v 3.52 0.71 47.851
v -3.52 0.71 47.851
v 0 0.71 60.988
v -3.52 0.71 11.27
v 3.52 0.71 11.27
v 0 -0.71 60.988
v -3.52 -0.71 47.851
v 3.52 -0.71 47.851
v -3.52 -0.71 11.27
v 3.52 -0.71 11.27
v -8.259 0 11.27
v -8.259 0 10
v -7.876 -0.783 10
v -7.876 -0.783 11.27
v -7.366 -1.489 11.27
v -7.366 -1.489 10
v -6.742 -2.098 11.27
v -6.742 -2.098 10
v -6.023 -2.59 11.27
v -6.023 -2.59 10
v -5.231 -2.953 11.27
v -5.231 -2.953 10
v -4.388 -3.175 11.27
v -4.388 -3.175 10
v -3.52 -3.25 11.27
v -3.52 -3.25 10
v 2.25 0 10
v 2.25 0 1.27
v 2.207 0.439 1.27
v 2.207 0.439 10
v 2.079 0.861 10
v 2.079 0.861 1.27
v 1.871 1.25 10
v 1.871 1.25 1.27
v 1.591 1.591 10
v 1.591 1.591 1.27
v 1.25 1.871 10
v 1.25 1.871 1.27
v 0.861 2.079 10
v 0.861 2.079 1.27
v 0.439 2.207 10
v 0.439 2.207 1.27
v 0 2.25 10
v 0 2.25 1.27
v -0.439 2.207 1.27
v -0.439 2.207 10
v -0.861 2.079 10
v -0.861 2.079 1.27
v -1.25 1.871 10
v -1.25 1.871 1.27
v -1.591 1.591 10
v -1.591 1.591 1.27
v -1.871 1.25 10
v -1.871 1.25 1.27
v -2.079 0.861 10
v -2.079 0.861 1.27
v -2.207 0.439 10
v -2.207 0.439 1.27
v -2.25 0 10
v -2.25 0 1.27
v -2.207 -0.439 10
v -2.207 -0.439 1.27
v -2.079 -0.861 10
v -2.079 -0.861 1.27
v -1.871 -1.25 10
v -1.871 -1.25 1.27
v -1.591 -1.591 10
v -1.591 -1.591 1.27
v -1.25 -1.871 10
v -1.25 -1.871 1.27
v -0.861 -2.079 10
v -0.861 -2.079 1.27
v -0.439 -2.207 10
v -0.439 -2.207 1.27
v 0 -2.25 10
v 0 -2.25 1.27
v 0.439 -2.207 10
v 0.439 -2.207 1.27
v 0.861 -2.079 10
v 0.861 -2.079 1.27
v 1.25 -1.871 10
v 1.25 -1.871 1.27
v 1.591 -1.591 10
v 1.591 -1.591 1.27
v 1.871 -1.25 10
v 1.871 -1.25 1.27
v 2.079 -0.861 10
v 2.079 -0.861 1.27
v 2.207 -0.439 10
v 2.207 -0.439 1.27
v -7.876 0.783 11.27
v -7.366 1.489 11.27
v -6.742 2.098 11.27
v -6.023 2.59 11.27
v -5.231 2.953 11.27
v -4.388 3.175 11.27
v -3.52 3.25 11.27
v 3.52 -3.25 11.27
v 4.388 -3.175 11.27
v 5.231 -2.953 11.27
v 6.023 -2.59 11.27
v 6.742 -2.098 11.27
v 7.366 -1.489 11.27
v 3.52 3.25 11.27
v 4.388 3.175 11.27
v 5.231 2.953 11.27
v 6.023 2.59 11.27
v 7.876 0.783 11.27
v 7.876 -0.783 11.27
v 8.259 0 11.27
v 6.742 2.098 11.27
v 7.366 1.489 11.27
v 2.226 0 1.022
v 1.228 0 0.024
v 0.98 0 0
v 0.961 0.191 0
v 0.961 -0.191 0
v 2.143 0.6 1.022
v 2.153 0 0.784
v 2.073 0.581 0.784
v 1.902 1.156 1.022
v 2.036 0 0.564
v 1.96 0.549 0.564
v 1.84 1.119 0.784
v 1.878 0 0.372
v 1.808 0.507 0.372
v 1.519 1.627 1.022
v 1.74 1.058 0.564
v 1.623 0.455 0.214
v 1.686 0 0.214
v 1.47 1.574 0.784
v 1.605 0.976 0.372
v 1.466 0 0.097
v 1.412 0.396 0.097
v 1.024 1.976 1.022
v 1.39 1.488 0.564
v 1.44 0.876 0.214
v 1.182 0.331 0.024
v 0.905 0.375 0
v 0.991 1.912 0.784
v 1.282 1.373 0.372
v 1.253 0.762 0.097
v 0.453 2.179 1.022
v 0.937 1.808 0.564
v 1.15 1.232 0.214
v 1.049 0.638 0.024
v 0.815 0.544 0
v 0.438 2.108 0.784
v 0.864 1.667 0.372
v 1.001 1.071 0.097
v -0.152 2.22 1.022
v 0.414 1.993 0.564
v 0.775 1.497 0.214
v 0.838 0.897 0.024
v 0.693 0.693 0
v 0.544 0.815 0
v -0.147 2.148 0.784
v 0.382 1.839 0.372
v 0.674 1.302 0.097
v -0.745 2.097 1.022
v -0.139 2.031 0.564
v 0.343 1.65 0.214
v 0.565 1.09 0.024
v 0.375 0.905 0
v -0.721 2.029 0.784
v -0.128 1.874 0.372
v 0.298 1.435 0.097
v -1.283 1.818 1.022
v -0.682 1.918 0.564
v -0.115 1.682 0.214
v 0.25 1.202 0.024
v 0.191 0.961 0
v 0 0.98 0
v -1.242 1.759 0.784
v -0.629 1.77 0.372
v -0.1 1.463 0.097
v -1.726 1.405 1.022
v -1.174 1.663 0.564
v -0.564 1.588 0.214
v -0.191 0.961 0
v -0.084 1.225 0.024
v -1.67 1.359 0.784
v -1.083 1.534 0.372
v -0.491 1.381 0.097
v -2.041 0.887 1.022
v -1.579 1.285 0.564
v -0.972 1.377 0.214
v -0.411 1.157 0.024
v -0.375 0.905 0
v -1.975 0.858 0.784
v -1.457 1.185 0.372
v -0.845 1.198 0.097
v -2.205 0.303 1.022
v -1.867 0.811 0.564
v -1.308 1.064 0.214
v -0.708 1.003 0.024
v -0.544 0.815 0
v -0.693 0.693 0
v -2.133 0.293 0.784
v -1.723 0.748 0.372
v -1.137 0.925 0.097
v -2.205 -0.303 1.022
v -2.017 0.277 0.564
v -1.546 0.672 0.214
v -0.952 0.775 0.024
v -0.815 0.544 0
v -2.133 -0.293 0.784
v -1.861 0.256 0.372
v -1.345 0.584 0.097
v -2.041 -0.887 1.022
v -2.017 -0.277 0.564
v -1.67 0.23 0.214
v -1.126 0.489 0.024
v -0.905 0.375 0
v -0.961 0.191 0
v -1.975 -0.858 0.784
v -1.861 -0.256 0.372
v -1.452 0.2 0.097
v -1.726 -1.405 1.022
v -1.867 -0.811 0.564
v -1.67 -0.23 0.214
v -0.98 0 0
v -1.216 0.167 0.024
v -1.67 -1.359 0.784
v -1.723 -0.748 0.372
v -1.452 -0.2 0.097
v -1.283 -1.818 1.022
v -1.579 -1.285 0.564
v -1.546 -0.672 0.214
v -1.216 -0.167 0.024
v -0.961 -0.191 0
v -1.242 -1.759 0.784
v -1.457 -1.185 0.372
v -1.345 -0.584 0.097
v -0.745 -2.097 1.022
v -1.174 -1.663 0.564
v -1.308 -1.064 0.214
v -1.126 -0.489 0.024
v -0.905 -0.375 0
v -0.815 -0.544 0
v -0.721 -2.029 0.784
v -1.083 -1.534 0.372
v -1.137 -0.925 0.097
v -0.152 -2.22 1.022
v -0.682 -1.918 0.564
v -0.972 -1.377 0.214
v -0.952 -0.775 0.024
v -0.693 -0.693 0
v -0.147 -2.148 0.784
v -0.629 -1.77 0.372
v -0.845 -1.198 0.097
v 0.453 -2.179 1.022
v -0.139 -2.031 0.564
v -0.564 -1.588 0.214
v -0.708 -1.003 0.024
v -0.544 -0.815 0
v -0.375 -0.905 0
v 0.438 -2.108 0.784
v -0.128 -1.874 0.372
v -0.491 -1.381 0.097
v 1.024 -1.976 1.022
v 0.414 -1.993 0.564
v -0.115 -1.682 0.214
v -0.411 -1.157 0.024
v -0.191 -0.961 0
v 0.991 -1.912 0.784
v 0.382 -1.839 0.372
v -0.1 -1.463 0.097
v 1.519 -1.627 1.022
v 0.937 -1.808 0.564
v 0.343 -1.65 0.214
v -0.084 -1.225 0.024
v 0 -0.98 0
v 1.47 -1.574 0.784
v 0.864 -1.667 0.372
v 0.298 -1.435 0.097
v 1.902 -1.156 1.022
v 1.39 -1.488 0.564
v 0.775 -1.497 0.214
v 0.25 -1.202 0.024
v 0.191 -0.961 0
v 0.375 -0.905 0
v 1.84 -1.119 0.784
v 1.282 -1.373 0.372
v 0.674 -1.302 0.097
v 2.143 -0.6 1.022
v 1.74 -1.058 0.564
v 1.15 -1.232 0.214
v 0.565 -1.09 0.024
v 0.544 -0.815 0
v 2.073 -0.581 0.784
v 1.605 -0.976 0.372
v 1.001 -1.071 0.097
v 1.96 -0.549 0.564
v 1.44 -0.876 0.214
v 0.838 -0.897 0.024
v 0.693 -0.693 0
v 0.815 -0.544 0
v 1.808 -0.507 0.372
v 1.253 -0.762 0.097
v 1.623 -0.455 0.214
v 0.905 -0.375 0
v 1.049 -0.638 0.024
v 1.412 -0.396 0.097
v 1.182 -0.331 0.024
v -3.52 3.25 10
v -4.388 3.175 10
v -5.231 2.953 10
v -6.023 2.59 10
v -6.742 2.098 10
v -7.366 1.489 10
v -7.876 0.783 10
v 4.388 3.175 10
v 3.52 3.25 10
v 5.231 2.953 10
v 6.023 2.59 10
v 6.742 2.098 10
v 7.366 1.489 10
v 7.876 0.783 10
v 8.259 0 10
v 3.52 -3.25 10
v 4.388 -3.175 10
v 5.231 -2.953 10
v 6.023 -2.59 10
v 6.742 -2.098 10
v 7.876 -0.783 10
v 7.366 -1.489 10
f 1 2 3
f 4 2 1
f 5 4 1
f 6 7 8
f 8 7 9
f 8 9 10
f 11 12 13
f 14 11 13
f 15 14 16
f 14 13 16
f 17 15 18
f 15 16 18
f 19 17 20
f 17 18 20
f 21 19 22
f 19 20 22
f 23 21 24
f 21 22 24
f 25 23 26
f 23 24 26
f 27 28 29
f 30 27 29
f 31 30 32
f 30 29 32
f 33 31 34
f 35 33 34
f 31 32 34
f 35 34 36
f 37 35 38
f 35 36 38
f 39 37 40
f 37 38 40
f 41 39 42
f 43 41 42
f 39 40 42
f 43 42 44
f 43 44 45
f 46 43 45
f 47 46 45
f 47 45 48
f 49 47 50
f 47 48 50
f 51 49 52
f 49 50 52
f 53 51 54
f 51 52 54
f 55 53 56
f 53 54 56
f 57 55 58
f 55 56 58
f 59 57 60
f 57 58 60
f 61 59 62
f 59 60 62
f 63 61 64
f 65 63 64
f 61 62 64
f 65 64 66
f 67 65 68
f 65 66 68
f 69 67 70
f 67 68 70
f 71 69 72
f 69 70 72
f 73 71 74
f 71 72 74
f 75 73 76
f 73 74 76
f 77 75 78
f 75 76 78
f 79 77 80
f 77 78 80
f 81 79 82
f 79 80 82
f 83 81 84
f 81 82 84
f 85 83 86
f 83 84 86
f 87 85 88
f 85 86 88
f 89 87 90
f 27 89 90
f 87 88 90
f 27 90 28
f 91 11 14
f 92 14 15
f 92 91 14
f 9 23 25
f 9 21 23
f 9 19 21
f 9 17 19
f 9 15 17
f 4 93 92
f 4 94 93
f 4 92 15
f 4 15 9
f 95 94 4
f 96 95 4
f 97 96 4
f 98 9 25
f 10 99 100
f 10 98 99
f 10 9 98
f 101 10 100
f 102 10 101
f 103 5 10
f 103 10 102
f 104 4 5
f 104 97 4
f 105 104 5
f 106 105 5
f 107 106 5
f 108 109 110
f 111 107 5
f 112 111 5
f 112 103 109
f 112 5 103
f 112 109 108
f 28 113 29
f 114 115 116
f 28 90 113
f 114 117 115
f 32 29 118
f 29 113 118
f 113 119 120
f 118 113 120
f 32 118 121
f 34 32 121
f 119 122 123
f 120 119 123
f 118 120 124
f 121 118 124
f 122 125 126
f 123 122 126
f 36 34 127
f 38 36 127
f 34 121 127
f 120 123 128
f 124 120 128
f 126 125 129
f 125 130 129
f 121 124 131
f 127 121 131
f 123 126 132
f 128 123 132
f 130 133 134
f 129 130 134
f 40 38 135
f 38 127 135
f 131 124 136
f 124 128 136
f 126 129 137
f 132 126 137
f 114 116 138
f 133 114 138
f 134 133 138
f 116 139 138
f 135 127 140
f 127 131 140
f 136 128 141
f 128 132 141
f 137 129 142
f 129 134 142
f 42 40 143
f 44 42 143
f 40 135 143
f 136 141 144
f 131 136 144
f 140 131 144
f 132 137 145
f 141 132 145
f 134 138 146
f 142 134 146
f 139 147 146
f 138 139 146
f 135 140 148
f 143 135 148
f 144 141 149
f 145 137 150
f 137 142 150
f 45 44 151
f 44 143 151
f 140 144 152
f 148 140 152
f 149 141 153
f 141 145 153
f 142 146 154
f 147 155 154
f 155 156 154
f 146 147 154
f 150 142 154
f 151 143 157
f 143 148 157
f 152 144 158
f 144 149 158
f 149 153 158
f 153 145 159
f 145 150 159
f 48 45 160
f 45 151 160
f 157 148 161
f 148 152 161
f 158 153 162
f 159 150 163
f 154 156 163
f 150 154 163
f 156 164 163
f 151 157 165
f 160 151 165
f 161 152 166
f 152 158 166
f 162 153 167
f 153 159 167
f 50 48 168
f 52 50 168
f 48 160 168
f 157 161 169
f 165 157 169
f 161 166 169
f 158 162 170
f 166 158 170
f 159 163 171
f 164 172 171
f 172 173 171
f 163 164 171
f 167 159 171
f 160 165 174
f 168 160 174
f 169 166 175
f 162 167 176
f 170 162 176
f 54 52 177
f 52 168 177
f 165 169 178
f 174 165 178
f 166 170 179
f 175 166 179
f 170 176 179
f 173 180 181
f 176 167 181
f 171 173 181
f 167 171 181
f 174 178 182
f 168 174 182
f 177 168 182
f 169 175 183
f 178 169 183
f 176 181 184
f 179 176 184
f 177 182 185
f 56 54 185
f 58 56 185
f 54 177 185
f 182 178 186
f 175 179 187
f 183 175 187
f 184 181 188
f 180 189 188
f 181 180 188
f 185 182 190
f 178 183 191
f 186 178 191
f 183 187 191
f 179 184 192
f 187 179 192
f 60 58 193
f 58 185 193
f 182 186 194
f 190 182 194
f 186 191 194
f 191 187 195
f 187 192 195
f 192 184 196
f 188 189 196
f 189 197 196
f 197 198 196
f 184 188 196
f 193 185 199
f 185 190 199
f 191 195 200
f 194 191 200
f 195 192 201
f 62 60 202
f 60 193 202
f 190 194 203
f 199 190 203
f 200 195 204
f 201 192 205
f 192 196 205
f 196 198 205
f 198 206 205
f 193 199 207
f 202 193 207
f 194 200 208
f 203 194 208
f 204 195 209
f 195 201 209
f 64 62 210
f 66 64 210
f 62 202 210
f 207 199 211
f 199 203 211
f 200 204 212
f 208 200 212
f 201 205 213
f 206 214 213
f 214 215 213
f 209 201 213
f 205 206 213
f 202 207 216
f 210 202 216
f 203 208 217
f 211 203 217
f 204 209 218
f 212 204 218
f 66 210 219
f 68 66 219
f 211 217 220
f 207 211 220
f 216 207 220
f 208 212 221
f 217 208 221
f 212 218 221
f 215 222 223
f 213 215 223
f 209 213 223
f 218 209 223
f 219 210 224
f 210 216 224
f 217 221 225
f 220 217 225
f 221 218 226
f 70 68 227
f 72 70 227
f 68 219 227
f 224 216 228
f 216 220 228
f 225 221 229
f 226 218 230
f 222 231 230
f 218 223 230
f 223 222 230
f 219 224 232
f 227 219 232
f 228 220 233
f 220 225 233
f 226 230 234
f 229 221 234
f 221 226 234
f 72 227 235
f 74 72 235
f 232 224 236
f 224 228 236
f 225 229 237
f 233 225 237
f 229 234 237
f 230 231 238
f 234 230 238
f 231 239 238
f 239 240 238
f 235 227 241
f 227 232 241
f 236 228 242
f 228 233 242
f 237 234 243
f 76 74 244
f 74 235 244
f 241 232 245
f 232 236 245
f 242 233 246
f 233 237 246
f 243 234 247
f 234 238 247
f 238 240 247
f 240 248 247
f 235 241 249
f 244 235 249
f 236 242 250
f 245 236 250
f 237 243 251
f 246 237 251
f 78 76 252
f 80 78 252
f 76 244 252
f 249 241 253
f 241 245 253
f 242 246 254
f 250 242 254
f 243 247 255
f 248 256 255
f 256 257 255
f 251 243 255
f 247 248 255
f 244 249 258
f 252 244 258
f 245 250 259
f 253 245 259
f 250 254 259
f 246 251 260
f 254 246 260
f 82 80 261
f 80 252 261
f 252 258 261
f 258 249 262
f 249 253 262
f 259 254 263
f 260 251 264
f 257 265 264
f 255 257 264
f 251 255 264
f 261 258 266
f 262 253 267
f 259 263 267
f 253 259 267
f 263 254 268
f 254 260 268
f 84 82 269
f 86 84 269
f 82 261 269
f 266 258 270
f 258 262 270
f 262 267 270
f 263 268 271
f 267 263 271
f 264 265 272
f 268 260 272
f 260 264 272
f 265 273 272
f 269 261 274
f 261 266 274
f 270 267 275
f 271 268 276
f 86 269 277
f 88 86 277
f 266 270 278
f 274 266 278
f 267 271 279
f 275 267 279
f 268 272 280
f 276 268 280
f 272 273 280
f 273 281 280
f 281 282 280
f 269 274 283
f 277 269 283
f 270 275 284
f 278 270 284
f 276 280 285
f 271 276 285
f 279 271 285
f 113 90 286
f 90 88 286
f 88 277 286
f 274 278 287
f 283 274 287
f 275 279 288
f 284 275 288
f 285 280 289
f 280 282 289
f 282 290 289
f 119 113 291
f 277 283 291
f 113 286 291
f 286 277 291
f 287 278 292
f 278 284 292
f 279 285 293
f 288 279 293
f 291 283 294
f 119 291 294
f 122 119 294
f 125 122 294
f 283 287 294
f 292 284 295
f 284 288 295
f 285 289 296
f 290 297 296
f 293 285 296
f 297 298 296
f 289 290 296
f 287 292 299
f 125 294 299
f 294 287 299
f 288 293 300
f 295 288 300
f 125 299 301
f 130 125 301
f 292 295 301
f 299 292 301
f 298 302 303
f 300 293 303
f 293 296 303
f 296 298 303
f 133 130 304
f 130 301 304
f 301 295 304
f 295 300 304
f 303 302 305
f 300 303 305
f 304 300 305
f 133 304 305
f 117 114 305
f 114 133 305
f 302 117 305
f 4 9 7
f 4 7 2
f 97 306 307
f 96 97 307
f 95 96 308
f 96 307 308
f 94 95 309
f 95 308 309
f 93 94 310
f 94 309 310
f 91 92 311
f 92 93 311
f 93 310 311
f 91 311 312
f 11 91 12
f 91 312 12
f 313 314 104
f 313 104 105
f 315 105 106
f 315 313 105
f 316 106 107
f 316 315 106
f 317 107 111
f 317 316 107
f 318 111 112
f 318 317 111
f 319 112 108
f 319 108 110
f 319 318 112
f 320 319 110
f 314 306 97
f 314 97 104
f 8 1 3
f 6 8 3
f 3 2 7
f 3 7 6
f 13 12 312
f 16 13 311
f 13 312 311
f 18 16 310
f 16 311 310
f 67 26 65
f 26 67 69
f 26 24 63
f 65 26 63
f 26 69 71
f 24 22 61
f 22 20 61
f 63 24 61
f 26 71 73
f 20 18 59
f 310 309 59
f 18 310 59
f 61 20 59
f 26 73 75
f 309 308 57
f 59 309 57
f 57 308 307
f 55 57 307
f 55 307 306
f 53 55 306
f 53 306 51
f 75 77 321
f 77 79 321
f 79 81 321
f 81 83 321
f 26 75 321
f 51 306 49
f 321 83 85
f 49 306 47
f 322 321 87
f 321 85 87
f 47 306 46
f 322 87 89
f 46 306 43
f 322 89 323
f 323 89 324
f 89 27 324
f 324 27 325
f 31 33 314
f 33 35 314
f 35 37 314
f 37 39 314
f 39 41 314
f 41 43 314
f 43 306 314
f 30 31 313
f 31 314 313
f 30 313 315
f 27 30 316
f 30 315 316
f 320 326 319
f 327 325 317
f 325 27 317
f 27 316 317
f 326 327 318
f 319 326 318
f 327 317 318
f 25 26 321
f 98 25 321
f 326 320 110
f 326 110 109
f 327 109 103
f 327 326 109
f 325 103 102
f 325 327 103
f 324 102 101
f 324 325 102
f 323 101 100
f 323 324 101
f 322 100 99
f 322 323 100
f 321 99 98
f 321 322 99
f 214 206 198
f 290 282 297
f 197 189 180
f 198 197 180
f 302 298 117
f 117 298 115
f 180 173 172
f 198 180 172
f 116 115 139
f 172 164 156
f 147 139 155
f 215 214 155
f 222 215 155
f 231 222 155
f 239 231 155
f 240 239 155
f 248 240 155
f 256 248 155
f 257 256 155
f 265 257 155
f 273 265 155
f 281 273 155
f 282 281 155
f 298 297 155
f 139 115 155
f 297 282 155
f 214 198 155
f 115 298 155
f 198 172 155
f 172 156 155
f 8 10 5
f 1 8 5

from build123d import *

# Parameters (mm, degrees)
F0_R        = 2.25
F1_DEPTH    = 10
F2_W        = 17.2
F2_H        = 6.5
F2_R        = 2.25
F3_DEPTH    = 1.27
F4_W        = 7.04
F4_H        = 1.42
F5_DEPTH    = 50.8
F6_T1_DEPTH = 75.2661578682
F7_T1_DEPTH = 26.67
F8_R        = 1.27


# Not quite as in the source:
# - a fillet or chamfer that OpenCascade refuses, or shapes differently, is made with other operations: its cross-section is extruded or revolved along the edge and cut away or added


with BuildPart() as f1:
    # F0 (on Top) → F1 (new body)
    with BuildSketch(Plane.XY):
        Circle(F0_R)
    extrude(amount=F1_DEPTH)

    # F2 (on face) → F3 (join)
    with BuildSketch(Plane.XY.offset(10)):
        Rectangle(F2_W, F2_H)
        Circle(F2_R, mode=Mode.SUBTRACT)
        Circle(F2_R)
    extrude(amount=F3_DEPTH)

    # F4 (on face) → F5 (join)
    with BuildSketch(Plane.XY.offset(11.27)):
        Rectangle(F4_W, F4_H)
    extrude(amount=F5_DEPTH)

    # F6: chamfer of 3.81 x 14.2191135768 on 2 edges, made by hand

    # F6_s2 → F6_t1 (cut)
    with BuildSketch(Plane.XZ.offset(-37.6330789341)):
        Polygon((-3.52, 47.8508864232), (0.29, 62.07), (-3.52, 62.07), align=None)
        Polygon((3.52, 47.8508864232), (-0.29, 62.07), (3.52, 62.07), align=None)
    extrude(amount=F6_T1_DEPTH, mode=Mode.SUBTRACT)

    # F7: fillet of radius 5.08 on 4 edges, made by hand

    # F7_s2 → F7_t1 (cut)
    with BuildSketch(Plane.XY.offset(-2.7)):
        with BuildLine():
            ThreePointArc((-8.6, 1.83), (-7.1121024484, -1.7621024484), (-3.52, -3.25))
            Line((-3.52, -3.25), (-8.6, -3.25))
            Line((-8.6, -3.25), (-8.6, 1.83))
        make_face()
        with BuildLine():
            ThreePointArc((-3.52, 3.25), (-7.1121024484, 1.7621024484), (-8.6, -1.83))
            Line((-8.6, -1.83), (-8.6, 3.25))
            Line((-8.6, 3.25), (-3.52, 3.25))
        make_face()
        with BuildLine():
            ThreePointArc((8.6, 1.83), (7.1121024484, -1.7621024484), (3.52, -3.25))
            Line((3.52, -3.25), (8.6, -3.25))
            Line((8.6, -3.25), (8.6, 1.83))
        make_face()
        with BuildLine():
            ThreePointArc((3.52, 3.25), (7.1121024484, 1.7621024484), (8.6, -1.83))
            Line((8.6, -1.83), (8.6, 3.25))
            Line((8.6, 3.25), (3.52, 3.25))
        make_face()
    extrude(amount=F7_T1_DEPTH, mode=Mode.SUBTRACT)

    # F8
    f8_edges = [f1.edges().sort_by_distance(p)[0] for p in [
        (-2.25, 0, 0),
    ]]
    fillet(f8_edges, radius=F8_R)


solid = f1.part
